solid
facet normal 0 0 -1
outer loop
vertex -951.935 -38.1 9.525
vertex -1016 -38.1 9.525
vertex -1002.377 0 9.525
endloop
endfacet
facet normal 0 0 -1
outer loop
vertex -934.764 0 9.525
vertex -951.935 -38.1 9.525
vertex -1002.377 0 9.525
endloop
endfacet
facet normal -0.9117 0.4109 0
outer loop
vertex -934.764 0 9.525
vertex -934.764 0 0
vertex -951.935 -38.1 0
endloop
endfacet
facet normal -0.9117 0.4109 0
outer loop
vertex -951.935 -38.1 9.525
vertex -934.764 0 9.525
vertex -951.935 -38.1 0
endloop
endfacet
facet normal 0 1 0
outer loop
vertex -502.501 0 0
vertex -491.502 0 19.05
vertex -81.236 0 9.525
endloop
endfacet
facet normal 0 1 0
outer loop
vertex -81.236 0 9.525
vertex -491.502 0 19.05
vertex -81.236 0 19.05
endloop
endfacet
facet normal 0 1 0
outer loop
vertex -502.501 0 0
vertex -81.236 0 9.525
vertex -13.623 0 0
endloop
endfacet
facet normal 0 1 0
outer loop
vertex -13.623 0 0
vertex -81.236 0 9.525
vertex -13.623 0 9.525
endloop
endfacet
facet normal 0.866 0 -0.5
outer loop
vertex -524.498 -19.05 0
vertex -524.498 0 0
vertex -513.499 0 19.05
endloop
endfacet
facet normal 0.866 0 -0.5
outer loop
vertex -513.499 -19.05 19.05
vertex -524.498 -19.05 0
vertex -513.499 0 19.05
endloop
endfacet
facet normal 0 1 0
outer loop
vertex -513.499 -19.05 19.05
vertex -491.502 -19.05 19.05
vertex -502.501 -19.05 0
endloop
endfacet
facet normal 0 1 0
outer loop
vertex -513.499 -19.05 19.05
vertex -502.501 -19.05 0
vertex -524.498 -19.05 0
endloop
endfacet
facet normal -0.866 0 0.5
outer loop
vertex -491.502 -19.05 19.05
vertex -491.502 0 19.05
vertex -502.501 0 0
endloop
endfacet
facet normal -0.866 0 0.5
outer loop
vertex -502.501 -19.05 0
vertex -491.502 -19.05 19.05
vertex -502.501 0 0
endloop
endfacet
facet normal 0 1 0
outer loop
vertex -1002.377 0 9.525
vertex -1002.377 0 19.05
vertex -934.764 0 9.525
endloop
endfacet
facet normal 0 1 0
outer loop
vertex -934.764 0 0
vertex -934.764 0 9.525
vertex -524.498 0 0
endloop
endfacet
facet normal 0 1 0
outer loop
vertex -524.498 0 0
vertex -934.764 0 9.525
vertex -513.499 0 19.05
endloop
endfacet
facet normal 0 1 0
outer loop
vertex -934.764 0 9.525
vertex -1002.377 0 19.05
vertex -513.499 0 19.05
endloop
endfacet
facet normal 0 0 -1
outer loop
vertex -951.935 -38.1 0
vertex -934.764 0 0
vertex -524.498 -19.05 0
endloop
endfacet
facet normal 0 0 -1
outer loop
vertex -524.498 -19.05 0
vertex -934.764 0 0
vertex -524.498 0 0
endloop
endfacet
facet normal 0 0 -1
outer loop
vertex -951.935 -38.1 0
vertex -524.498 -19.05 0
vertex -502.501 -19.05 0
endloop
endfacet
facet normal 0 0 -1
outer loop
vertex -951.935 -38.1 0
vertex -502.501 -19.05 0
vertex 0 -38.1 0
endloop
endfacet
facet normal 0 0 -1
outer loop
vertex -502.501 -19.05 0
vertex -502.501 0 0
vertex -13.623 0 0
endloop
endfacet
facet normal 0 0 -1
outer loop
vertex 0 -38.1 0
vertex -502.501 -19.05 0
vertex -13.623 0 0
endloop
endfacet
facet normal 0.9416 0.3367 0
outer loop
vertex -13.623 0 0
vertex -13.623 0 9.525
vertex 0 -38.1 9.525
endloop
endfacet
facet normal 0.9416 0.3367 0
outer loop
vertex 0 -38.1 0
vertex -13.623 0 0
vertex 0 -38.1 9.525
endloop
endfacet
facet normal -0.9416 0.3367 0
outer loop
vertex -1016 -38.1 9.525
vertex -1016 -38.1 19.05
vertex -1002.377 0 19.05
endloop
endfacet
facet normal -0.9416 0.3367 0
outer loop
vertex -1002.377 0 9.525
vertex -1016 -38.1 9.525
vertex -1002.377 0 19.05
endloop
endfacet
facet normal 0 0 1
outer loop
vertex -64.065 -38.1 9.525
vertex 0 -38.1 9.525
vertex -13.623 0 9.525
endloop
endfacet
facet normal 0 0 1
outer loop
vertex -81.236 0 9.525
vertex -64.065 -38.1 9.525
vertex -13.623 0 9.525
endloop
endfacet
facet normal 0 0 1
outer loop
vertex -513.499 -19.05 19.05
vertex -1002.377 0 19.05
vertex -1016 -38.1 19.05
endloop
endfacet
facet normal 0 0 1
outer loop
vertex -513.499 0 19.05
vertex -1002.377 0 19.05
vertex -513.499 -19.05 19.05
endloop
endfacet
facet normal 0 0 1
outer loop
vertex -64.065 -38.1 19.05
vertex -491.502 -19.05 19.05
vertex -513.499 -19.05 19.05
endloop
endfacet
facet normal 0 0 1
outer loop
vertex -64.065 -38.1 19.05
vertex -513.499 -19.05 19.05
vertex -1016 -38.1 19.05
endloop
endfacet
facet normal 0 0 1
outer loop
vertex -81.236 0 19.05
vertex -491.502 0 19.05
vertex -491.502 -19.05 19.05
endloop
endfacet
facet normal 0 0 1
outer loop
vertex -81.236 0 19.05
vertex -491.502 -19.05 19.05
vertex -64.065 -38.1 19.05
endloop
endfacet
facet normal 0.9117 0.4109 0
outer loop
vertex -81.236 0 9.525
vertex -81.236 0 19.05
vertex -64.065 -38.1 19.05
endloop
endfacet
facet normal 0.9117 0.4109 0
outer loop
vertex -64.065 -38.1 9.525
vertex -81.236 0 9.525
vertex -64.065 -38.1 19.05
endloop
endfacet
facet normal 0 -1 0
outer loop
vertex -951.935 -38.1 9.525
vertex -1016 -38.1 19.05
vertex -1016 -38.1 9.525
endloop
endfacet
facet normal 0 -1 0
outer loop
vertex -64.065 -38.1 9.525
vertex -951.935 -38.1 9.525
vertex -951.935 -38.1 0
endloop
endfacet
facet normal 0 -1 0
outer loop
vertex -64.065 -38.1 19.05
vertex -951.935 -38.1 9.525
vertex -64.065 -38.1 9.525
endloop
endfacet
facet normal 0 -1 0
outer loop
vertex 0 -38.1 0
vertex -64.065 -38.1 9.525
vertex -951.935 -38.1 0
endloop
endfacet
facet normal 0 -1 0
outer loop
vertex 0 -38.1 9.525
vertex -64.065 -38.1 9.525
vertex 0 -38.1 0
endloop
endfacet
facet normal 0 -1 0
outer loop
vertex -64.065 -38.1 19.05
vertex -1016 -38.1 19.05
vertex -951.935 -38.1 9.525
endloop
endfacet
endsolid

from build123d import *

# Parameters (mm, degrees)
F0_W      = 1016
F0_H      = 19.05
F1_DEPTH  = 38.1
F3_DEPTH  = 50.8
F5_DEPTH  = 76.2
F7_DEPTH  = 60.325
F9_DEPTH  = 9.525
F11_DEPTH = 60.325
F13_DEPTH = 19.05
F15_DEPTH = 9.525


with BuildPart() as f1:
    # F0 (on Front) → F1 (new body)
    with BuildSketch(Plane.XZ):
        with Locations((-508, 9.525)):
            Rectangle(F0_W, F0_H)
    extrude(amount=F1_DEPTH)

    # F2 (on face) → F3 (cut)
    with BuildSketch(Plane.XY.offset(19.05)):
        Polygon((-1016, 0), (-1016, -38.1), (-1002.3770791998, 0), align=None)
    extrude(amount=-F3_DEPTH, mode=Mode.SUBTRACT)

    # F4 (on face) → F5 (cut)
    with BuildSketch(Plane.XY.offset(19.05)):
        Polygon((-13.6229208002, 0), (0, -38.1), (0, 0), align=None)
    extrude(amount=-F5_DEPTH, mode=Mode.SUBTRACT)

    # F6 (on face) → F7 (cut)
    with BuildSketch(Plane(origin=(-888.7527181239, 317.7797346454, 0), x_dir=(-0.3366822055, -0.941618337, 0), z_dir=(-0.941618337, 0.3366822055, 0))):
        Polygon((252.7767419815, 9.525), (258.7343550339, 0), (377.9447794005, 0), (377.9447794005, 9.525), align=None)
    extrude(amount=-F7_DEPTH, mode=Mode.SUBTRACT)

    # F8 (on face) → F9 (cut)
    with BuildSketch(Plane(origin=(0, 0, 0), x_dir=(1, 0, 0), z_dir=(0, 0, -1))):
        Polygon((-951.9347650406, 38.1), (-951.9347650406, 0), (-934.7637907817, 0), align=None)
    extrude(amount=-F9_DEPTH, mode=Mode.SUBTRACT)

    # F10 (on face) → F11 (cut)
    with BuildSketch(Plane(origin=(-12.0786958733, -4.3188219751, 0), x_dir=(-0.3366822055, 0.941618337, 0), z_dir=(0.941618337, 0.3366822055, 0))):
        Polygon((-35.8756586385, 19.05), (-35.8756586385, 9.525), (45.2719508199, 9.525), (45.6329248846, 19.05), align=None)
    extrude(amount=-F11_DEPTH, mode=Mode.SUBTRACT)

    # F12 (on face) → F13 (cut)
    with BuildSketch(Plane(origin=(0, 0, 0), x_dir=(-1, 0, 0), z_dir=(0, 1, 0))):
        Polygon((524.497778814, 0), (513.499256186, 19.05), (491.502221186, 19.05), (502.500743814, 0), align=None)
    extrude(amount=-F13_DEPTH, mode=Mode.SUBTRACT)

    # F14 (on face) → F15 (cut)
    with BuildSketch(Plane.XY.offset(19.05)):
        Polygon((-64.0652349594, 0), (-81.2362092183, 0), (-64.0652349594, -38.1), align=None)
    extrude(amount=-F15_DEPTH, mode=Mode.SUBTRACT)


solid = f1.part
